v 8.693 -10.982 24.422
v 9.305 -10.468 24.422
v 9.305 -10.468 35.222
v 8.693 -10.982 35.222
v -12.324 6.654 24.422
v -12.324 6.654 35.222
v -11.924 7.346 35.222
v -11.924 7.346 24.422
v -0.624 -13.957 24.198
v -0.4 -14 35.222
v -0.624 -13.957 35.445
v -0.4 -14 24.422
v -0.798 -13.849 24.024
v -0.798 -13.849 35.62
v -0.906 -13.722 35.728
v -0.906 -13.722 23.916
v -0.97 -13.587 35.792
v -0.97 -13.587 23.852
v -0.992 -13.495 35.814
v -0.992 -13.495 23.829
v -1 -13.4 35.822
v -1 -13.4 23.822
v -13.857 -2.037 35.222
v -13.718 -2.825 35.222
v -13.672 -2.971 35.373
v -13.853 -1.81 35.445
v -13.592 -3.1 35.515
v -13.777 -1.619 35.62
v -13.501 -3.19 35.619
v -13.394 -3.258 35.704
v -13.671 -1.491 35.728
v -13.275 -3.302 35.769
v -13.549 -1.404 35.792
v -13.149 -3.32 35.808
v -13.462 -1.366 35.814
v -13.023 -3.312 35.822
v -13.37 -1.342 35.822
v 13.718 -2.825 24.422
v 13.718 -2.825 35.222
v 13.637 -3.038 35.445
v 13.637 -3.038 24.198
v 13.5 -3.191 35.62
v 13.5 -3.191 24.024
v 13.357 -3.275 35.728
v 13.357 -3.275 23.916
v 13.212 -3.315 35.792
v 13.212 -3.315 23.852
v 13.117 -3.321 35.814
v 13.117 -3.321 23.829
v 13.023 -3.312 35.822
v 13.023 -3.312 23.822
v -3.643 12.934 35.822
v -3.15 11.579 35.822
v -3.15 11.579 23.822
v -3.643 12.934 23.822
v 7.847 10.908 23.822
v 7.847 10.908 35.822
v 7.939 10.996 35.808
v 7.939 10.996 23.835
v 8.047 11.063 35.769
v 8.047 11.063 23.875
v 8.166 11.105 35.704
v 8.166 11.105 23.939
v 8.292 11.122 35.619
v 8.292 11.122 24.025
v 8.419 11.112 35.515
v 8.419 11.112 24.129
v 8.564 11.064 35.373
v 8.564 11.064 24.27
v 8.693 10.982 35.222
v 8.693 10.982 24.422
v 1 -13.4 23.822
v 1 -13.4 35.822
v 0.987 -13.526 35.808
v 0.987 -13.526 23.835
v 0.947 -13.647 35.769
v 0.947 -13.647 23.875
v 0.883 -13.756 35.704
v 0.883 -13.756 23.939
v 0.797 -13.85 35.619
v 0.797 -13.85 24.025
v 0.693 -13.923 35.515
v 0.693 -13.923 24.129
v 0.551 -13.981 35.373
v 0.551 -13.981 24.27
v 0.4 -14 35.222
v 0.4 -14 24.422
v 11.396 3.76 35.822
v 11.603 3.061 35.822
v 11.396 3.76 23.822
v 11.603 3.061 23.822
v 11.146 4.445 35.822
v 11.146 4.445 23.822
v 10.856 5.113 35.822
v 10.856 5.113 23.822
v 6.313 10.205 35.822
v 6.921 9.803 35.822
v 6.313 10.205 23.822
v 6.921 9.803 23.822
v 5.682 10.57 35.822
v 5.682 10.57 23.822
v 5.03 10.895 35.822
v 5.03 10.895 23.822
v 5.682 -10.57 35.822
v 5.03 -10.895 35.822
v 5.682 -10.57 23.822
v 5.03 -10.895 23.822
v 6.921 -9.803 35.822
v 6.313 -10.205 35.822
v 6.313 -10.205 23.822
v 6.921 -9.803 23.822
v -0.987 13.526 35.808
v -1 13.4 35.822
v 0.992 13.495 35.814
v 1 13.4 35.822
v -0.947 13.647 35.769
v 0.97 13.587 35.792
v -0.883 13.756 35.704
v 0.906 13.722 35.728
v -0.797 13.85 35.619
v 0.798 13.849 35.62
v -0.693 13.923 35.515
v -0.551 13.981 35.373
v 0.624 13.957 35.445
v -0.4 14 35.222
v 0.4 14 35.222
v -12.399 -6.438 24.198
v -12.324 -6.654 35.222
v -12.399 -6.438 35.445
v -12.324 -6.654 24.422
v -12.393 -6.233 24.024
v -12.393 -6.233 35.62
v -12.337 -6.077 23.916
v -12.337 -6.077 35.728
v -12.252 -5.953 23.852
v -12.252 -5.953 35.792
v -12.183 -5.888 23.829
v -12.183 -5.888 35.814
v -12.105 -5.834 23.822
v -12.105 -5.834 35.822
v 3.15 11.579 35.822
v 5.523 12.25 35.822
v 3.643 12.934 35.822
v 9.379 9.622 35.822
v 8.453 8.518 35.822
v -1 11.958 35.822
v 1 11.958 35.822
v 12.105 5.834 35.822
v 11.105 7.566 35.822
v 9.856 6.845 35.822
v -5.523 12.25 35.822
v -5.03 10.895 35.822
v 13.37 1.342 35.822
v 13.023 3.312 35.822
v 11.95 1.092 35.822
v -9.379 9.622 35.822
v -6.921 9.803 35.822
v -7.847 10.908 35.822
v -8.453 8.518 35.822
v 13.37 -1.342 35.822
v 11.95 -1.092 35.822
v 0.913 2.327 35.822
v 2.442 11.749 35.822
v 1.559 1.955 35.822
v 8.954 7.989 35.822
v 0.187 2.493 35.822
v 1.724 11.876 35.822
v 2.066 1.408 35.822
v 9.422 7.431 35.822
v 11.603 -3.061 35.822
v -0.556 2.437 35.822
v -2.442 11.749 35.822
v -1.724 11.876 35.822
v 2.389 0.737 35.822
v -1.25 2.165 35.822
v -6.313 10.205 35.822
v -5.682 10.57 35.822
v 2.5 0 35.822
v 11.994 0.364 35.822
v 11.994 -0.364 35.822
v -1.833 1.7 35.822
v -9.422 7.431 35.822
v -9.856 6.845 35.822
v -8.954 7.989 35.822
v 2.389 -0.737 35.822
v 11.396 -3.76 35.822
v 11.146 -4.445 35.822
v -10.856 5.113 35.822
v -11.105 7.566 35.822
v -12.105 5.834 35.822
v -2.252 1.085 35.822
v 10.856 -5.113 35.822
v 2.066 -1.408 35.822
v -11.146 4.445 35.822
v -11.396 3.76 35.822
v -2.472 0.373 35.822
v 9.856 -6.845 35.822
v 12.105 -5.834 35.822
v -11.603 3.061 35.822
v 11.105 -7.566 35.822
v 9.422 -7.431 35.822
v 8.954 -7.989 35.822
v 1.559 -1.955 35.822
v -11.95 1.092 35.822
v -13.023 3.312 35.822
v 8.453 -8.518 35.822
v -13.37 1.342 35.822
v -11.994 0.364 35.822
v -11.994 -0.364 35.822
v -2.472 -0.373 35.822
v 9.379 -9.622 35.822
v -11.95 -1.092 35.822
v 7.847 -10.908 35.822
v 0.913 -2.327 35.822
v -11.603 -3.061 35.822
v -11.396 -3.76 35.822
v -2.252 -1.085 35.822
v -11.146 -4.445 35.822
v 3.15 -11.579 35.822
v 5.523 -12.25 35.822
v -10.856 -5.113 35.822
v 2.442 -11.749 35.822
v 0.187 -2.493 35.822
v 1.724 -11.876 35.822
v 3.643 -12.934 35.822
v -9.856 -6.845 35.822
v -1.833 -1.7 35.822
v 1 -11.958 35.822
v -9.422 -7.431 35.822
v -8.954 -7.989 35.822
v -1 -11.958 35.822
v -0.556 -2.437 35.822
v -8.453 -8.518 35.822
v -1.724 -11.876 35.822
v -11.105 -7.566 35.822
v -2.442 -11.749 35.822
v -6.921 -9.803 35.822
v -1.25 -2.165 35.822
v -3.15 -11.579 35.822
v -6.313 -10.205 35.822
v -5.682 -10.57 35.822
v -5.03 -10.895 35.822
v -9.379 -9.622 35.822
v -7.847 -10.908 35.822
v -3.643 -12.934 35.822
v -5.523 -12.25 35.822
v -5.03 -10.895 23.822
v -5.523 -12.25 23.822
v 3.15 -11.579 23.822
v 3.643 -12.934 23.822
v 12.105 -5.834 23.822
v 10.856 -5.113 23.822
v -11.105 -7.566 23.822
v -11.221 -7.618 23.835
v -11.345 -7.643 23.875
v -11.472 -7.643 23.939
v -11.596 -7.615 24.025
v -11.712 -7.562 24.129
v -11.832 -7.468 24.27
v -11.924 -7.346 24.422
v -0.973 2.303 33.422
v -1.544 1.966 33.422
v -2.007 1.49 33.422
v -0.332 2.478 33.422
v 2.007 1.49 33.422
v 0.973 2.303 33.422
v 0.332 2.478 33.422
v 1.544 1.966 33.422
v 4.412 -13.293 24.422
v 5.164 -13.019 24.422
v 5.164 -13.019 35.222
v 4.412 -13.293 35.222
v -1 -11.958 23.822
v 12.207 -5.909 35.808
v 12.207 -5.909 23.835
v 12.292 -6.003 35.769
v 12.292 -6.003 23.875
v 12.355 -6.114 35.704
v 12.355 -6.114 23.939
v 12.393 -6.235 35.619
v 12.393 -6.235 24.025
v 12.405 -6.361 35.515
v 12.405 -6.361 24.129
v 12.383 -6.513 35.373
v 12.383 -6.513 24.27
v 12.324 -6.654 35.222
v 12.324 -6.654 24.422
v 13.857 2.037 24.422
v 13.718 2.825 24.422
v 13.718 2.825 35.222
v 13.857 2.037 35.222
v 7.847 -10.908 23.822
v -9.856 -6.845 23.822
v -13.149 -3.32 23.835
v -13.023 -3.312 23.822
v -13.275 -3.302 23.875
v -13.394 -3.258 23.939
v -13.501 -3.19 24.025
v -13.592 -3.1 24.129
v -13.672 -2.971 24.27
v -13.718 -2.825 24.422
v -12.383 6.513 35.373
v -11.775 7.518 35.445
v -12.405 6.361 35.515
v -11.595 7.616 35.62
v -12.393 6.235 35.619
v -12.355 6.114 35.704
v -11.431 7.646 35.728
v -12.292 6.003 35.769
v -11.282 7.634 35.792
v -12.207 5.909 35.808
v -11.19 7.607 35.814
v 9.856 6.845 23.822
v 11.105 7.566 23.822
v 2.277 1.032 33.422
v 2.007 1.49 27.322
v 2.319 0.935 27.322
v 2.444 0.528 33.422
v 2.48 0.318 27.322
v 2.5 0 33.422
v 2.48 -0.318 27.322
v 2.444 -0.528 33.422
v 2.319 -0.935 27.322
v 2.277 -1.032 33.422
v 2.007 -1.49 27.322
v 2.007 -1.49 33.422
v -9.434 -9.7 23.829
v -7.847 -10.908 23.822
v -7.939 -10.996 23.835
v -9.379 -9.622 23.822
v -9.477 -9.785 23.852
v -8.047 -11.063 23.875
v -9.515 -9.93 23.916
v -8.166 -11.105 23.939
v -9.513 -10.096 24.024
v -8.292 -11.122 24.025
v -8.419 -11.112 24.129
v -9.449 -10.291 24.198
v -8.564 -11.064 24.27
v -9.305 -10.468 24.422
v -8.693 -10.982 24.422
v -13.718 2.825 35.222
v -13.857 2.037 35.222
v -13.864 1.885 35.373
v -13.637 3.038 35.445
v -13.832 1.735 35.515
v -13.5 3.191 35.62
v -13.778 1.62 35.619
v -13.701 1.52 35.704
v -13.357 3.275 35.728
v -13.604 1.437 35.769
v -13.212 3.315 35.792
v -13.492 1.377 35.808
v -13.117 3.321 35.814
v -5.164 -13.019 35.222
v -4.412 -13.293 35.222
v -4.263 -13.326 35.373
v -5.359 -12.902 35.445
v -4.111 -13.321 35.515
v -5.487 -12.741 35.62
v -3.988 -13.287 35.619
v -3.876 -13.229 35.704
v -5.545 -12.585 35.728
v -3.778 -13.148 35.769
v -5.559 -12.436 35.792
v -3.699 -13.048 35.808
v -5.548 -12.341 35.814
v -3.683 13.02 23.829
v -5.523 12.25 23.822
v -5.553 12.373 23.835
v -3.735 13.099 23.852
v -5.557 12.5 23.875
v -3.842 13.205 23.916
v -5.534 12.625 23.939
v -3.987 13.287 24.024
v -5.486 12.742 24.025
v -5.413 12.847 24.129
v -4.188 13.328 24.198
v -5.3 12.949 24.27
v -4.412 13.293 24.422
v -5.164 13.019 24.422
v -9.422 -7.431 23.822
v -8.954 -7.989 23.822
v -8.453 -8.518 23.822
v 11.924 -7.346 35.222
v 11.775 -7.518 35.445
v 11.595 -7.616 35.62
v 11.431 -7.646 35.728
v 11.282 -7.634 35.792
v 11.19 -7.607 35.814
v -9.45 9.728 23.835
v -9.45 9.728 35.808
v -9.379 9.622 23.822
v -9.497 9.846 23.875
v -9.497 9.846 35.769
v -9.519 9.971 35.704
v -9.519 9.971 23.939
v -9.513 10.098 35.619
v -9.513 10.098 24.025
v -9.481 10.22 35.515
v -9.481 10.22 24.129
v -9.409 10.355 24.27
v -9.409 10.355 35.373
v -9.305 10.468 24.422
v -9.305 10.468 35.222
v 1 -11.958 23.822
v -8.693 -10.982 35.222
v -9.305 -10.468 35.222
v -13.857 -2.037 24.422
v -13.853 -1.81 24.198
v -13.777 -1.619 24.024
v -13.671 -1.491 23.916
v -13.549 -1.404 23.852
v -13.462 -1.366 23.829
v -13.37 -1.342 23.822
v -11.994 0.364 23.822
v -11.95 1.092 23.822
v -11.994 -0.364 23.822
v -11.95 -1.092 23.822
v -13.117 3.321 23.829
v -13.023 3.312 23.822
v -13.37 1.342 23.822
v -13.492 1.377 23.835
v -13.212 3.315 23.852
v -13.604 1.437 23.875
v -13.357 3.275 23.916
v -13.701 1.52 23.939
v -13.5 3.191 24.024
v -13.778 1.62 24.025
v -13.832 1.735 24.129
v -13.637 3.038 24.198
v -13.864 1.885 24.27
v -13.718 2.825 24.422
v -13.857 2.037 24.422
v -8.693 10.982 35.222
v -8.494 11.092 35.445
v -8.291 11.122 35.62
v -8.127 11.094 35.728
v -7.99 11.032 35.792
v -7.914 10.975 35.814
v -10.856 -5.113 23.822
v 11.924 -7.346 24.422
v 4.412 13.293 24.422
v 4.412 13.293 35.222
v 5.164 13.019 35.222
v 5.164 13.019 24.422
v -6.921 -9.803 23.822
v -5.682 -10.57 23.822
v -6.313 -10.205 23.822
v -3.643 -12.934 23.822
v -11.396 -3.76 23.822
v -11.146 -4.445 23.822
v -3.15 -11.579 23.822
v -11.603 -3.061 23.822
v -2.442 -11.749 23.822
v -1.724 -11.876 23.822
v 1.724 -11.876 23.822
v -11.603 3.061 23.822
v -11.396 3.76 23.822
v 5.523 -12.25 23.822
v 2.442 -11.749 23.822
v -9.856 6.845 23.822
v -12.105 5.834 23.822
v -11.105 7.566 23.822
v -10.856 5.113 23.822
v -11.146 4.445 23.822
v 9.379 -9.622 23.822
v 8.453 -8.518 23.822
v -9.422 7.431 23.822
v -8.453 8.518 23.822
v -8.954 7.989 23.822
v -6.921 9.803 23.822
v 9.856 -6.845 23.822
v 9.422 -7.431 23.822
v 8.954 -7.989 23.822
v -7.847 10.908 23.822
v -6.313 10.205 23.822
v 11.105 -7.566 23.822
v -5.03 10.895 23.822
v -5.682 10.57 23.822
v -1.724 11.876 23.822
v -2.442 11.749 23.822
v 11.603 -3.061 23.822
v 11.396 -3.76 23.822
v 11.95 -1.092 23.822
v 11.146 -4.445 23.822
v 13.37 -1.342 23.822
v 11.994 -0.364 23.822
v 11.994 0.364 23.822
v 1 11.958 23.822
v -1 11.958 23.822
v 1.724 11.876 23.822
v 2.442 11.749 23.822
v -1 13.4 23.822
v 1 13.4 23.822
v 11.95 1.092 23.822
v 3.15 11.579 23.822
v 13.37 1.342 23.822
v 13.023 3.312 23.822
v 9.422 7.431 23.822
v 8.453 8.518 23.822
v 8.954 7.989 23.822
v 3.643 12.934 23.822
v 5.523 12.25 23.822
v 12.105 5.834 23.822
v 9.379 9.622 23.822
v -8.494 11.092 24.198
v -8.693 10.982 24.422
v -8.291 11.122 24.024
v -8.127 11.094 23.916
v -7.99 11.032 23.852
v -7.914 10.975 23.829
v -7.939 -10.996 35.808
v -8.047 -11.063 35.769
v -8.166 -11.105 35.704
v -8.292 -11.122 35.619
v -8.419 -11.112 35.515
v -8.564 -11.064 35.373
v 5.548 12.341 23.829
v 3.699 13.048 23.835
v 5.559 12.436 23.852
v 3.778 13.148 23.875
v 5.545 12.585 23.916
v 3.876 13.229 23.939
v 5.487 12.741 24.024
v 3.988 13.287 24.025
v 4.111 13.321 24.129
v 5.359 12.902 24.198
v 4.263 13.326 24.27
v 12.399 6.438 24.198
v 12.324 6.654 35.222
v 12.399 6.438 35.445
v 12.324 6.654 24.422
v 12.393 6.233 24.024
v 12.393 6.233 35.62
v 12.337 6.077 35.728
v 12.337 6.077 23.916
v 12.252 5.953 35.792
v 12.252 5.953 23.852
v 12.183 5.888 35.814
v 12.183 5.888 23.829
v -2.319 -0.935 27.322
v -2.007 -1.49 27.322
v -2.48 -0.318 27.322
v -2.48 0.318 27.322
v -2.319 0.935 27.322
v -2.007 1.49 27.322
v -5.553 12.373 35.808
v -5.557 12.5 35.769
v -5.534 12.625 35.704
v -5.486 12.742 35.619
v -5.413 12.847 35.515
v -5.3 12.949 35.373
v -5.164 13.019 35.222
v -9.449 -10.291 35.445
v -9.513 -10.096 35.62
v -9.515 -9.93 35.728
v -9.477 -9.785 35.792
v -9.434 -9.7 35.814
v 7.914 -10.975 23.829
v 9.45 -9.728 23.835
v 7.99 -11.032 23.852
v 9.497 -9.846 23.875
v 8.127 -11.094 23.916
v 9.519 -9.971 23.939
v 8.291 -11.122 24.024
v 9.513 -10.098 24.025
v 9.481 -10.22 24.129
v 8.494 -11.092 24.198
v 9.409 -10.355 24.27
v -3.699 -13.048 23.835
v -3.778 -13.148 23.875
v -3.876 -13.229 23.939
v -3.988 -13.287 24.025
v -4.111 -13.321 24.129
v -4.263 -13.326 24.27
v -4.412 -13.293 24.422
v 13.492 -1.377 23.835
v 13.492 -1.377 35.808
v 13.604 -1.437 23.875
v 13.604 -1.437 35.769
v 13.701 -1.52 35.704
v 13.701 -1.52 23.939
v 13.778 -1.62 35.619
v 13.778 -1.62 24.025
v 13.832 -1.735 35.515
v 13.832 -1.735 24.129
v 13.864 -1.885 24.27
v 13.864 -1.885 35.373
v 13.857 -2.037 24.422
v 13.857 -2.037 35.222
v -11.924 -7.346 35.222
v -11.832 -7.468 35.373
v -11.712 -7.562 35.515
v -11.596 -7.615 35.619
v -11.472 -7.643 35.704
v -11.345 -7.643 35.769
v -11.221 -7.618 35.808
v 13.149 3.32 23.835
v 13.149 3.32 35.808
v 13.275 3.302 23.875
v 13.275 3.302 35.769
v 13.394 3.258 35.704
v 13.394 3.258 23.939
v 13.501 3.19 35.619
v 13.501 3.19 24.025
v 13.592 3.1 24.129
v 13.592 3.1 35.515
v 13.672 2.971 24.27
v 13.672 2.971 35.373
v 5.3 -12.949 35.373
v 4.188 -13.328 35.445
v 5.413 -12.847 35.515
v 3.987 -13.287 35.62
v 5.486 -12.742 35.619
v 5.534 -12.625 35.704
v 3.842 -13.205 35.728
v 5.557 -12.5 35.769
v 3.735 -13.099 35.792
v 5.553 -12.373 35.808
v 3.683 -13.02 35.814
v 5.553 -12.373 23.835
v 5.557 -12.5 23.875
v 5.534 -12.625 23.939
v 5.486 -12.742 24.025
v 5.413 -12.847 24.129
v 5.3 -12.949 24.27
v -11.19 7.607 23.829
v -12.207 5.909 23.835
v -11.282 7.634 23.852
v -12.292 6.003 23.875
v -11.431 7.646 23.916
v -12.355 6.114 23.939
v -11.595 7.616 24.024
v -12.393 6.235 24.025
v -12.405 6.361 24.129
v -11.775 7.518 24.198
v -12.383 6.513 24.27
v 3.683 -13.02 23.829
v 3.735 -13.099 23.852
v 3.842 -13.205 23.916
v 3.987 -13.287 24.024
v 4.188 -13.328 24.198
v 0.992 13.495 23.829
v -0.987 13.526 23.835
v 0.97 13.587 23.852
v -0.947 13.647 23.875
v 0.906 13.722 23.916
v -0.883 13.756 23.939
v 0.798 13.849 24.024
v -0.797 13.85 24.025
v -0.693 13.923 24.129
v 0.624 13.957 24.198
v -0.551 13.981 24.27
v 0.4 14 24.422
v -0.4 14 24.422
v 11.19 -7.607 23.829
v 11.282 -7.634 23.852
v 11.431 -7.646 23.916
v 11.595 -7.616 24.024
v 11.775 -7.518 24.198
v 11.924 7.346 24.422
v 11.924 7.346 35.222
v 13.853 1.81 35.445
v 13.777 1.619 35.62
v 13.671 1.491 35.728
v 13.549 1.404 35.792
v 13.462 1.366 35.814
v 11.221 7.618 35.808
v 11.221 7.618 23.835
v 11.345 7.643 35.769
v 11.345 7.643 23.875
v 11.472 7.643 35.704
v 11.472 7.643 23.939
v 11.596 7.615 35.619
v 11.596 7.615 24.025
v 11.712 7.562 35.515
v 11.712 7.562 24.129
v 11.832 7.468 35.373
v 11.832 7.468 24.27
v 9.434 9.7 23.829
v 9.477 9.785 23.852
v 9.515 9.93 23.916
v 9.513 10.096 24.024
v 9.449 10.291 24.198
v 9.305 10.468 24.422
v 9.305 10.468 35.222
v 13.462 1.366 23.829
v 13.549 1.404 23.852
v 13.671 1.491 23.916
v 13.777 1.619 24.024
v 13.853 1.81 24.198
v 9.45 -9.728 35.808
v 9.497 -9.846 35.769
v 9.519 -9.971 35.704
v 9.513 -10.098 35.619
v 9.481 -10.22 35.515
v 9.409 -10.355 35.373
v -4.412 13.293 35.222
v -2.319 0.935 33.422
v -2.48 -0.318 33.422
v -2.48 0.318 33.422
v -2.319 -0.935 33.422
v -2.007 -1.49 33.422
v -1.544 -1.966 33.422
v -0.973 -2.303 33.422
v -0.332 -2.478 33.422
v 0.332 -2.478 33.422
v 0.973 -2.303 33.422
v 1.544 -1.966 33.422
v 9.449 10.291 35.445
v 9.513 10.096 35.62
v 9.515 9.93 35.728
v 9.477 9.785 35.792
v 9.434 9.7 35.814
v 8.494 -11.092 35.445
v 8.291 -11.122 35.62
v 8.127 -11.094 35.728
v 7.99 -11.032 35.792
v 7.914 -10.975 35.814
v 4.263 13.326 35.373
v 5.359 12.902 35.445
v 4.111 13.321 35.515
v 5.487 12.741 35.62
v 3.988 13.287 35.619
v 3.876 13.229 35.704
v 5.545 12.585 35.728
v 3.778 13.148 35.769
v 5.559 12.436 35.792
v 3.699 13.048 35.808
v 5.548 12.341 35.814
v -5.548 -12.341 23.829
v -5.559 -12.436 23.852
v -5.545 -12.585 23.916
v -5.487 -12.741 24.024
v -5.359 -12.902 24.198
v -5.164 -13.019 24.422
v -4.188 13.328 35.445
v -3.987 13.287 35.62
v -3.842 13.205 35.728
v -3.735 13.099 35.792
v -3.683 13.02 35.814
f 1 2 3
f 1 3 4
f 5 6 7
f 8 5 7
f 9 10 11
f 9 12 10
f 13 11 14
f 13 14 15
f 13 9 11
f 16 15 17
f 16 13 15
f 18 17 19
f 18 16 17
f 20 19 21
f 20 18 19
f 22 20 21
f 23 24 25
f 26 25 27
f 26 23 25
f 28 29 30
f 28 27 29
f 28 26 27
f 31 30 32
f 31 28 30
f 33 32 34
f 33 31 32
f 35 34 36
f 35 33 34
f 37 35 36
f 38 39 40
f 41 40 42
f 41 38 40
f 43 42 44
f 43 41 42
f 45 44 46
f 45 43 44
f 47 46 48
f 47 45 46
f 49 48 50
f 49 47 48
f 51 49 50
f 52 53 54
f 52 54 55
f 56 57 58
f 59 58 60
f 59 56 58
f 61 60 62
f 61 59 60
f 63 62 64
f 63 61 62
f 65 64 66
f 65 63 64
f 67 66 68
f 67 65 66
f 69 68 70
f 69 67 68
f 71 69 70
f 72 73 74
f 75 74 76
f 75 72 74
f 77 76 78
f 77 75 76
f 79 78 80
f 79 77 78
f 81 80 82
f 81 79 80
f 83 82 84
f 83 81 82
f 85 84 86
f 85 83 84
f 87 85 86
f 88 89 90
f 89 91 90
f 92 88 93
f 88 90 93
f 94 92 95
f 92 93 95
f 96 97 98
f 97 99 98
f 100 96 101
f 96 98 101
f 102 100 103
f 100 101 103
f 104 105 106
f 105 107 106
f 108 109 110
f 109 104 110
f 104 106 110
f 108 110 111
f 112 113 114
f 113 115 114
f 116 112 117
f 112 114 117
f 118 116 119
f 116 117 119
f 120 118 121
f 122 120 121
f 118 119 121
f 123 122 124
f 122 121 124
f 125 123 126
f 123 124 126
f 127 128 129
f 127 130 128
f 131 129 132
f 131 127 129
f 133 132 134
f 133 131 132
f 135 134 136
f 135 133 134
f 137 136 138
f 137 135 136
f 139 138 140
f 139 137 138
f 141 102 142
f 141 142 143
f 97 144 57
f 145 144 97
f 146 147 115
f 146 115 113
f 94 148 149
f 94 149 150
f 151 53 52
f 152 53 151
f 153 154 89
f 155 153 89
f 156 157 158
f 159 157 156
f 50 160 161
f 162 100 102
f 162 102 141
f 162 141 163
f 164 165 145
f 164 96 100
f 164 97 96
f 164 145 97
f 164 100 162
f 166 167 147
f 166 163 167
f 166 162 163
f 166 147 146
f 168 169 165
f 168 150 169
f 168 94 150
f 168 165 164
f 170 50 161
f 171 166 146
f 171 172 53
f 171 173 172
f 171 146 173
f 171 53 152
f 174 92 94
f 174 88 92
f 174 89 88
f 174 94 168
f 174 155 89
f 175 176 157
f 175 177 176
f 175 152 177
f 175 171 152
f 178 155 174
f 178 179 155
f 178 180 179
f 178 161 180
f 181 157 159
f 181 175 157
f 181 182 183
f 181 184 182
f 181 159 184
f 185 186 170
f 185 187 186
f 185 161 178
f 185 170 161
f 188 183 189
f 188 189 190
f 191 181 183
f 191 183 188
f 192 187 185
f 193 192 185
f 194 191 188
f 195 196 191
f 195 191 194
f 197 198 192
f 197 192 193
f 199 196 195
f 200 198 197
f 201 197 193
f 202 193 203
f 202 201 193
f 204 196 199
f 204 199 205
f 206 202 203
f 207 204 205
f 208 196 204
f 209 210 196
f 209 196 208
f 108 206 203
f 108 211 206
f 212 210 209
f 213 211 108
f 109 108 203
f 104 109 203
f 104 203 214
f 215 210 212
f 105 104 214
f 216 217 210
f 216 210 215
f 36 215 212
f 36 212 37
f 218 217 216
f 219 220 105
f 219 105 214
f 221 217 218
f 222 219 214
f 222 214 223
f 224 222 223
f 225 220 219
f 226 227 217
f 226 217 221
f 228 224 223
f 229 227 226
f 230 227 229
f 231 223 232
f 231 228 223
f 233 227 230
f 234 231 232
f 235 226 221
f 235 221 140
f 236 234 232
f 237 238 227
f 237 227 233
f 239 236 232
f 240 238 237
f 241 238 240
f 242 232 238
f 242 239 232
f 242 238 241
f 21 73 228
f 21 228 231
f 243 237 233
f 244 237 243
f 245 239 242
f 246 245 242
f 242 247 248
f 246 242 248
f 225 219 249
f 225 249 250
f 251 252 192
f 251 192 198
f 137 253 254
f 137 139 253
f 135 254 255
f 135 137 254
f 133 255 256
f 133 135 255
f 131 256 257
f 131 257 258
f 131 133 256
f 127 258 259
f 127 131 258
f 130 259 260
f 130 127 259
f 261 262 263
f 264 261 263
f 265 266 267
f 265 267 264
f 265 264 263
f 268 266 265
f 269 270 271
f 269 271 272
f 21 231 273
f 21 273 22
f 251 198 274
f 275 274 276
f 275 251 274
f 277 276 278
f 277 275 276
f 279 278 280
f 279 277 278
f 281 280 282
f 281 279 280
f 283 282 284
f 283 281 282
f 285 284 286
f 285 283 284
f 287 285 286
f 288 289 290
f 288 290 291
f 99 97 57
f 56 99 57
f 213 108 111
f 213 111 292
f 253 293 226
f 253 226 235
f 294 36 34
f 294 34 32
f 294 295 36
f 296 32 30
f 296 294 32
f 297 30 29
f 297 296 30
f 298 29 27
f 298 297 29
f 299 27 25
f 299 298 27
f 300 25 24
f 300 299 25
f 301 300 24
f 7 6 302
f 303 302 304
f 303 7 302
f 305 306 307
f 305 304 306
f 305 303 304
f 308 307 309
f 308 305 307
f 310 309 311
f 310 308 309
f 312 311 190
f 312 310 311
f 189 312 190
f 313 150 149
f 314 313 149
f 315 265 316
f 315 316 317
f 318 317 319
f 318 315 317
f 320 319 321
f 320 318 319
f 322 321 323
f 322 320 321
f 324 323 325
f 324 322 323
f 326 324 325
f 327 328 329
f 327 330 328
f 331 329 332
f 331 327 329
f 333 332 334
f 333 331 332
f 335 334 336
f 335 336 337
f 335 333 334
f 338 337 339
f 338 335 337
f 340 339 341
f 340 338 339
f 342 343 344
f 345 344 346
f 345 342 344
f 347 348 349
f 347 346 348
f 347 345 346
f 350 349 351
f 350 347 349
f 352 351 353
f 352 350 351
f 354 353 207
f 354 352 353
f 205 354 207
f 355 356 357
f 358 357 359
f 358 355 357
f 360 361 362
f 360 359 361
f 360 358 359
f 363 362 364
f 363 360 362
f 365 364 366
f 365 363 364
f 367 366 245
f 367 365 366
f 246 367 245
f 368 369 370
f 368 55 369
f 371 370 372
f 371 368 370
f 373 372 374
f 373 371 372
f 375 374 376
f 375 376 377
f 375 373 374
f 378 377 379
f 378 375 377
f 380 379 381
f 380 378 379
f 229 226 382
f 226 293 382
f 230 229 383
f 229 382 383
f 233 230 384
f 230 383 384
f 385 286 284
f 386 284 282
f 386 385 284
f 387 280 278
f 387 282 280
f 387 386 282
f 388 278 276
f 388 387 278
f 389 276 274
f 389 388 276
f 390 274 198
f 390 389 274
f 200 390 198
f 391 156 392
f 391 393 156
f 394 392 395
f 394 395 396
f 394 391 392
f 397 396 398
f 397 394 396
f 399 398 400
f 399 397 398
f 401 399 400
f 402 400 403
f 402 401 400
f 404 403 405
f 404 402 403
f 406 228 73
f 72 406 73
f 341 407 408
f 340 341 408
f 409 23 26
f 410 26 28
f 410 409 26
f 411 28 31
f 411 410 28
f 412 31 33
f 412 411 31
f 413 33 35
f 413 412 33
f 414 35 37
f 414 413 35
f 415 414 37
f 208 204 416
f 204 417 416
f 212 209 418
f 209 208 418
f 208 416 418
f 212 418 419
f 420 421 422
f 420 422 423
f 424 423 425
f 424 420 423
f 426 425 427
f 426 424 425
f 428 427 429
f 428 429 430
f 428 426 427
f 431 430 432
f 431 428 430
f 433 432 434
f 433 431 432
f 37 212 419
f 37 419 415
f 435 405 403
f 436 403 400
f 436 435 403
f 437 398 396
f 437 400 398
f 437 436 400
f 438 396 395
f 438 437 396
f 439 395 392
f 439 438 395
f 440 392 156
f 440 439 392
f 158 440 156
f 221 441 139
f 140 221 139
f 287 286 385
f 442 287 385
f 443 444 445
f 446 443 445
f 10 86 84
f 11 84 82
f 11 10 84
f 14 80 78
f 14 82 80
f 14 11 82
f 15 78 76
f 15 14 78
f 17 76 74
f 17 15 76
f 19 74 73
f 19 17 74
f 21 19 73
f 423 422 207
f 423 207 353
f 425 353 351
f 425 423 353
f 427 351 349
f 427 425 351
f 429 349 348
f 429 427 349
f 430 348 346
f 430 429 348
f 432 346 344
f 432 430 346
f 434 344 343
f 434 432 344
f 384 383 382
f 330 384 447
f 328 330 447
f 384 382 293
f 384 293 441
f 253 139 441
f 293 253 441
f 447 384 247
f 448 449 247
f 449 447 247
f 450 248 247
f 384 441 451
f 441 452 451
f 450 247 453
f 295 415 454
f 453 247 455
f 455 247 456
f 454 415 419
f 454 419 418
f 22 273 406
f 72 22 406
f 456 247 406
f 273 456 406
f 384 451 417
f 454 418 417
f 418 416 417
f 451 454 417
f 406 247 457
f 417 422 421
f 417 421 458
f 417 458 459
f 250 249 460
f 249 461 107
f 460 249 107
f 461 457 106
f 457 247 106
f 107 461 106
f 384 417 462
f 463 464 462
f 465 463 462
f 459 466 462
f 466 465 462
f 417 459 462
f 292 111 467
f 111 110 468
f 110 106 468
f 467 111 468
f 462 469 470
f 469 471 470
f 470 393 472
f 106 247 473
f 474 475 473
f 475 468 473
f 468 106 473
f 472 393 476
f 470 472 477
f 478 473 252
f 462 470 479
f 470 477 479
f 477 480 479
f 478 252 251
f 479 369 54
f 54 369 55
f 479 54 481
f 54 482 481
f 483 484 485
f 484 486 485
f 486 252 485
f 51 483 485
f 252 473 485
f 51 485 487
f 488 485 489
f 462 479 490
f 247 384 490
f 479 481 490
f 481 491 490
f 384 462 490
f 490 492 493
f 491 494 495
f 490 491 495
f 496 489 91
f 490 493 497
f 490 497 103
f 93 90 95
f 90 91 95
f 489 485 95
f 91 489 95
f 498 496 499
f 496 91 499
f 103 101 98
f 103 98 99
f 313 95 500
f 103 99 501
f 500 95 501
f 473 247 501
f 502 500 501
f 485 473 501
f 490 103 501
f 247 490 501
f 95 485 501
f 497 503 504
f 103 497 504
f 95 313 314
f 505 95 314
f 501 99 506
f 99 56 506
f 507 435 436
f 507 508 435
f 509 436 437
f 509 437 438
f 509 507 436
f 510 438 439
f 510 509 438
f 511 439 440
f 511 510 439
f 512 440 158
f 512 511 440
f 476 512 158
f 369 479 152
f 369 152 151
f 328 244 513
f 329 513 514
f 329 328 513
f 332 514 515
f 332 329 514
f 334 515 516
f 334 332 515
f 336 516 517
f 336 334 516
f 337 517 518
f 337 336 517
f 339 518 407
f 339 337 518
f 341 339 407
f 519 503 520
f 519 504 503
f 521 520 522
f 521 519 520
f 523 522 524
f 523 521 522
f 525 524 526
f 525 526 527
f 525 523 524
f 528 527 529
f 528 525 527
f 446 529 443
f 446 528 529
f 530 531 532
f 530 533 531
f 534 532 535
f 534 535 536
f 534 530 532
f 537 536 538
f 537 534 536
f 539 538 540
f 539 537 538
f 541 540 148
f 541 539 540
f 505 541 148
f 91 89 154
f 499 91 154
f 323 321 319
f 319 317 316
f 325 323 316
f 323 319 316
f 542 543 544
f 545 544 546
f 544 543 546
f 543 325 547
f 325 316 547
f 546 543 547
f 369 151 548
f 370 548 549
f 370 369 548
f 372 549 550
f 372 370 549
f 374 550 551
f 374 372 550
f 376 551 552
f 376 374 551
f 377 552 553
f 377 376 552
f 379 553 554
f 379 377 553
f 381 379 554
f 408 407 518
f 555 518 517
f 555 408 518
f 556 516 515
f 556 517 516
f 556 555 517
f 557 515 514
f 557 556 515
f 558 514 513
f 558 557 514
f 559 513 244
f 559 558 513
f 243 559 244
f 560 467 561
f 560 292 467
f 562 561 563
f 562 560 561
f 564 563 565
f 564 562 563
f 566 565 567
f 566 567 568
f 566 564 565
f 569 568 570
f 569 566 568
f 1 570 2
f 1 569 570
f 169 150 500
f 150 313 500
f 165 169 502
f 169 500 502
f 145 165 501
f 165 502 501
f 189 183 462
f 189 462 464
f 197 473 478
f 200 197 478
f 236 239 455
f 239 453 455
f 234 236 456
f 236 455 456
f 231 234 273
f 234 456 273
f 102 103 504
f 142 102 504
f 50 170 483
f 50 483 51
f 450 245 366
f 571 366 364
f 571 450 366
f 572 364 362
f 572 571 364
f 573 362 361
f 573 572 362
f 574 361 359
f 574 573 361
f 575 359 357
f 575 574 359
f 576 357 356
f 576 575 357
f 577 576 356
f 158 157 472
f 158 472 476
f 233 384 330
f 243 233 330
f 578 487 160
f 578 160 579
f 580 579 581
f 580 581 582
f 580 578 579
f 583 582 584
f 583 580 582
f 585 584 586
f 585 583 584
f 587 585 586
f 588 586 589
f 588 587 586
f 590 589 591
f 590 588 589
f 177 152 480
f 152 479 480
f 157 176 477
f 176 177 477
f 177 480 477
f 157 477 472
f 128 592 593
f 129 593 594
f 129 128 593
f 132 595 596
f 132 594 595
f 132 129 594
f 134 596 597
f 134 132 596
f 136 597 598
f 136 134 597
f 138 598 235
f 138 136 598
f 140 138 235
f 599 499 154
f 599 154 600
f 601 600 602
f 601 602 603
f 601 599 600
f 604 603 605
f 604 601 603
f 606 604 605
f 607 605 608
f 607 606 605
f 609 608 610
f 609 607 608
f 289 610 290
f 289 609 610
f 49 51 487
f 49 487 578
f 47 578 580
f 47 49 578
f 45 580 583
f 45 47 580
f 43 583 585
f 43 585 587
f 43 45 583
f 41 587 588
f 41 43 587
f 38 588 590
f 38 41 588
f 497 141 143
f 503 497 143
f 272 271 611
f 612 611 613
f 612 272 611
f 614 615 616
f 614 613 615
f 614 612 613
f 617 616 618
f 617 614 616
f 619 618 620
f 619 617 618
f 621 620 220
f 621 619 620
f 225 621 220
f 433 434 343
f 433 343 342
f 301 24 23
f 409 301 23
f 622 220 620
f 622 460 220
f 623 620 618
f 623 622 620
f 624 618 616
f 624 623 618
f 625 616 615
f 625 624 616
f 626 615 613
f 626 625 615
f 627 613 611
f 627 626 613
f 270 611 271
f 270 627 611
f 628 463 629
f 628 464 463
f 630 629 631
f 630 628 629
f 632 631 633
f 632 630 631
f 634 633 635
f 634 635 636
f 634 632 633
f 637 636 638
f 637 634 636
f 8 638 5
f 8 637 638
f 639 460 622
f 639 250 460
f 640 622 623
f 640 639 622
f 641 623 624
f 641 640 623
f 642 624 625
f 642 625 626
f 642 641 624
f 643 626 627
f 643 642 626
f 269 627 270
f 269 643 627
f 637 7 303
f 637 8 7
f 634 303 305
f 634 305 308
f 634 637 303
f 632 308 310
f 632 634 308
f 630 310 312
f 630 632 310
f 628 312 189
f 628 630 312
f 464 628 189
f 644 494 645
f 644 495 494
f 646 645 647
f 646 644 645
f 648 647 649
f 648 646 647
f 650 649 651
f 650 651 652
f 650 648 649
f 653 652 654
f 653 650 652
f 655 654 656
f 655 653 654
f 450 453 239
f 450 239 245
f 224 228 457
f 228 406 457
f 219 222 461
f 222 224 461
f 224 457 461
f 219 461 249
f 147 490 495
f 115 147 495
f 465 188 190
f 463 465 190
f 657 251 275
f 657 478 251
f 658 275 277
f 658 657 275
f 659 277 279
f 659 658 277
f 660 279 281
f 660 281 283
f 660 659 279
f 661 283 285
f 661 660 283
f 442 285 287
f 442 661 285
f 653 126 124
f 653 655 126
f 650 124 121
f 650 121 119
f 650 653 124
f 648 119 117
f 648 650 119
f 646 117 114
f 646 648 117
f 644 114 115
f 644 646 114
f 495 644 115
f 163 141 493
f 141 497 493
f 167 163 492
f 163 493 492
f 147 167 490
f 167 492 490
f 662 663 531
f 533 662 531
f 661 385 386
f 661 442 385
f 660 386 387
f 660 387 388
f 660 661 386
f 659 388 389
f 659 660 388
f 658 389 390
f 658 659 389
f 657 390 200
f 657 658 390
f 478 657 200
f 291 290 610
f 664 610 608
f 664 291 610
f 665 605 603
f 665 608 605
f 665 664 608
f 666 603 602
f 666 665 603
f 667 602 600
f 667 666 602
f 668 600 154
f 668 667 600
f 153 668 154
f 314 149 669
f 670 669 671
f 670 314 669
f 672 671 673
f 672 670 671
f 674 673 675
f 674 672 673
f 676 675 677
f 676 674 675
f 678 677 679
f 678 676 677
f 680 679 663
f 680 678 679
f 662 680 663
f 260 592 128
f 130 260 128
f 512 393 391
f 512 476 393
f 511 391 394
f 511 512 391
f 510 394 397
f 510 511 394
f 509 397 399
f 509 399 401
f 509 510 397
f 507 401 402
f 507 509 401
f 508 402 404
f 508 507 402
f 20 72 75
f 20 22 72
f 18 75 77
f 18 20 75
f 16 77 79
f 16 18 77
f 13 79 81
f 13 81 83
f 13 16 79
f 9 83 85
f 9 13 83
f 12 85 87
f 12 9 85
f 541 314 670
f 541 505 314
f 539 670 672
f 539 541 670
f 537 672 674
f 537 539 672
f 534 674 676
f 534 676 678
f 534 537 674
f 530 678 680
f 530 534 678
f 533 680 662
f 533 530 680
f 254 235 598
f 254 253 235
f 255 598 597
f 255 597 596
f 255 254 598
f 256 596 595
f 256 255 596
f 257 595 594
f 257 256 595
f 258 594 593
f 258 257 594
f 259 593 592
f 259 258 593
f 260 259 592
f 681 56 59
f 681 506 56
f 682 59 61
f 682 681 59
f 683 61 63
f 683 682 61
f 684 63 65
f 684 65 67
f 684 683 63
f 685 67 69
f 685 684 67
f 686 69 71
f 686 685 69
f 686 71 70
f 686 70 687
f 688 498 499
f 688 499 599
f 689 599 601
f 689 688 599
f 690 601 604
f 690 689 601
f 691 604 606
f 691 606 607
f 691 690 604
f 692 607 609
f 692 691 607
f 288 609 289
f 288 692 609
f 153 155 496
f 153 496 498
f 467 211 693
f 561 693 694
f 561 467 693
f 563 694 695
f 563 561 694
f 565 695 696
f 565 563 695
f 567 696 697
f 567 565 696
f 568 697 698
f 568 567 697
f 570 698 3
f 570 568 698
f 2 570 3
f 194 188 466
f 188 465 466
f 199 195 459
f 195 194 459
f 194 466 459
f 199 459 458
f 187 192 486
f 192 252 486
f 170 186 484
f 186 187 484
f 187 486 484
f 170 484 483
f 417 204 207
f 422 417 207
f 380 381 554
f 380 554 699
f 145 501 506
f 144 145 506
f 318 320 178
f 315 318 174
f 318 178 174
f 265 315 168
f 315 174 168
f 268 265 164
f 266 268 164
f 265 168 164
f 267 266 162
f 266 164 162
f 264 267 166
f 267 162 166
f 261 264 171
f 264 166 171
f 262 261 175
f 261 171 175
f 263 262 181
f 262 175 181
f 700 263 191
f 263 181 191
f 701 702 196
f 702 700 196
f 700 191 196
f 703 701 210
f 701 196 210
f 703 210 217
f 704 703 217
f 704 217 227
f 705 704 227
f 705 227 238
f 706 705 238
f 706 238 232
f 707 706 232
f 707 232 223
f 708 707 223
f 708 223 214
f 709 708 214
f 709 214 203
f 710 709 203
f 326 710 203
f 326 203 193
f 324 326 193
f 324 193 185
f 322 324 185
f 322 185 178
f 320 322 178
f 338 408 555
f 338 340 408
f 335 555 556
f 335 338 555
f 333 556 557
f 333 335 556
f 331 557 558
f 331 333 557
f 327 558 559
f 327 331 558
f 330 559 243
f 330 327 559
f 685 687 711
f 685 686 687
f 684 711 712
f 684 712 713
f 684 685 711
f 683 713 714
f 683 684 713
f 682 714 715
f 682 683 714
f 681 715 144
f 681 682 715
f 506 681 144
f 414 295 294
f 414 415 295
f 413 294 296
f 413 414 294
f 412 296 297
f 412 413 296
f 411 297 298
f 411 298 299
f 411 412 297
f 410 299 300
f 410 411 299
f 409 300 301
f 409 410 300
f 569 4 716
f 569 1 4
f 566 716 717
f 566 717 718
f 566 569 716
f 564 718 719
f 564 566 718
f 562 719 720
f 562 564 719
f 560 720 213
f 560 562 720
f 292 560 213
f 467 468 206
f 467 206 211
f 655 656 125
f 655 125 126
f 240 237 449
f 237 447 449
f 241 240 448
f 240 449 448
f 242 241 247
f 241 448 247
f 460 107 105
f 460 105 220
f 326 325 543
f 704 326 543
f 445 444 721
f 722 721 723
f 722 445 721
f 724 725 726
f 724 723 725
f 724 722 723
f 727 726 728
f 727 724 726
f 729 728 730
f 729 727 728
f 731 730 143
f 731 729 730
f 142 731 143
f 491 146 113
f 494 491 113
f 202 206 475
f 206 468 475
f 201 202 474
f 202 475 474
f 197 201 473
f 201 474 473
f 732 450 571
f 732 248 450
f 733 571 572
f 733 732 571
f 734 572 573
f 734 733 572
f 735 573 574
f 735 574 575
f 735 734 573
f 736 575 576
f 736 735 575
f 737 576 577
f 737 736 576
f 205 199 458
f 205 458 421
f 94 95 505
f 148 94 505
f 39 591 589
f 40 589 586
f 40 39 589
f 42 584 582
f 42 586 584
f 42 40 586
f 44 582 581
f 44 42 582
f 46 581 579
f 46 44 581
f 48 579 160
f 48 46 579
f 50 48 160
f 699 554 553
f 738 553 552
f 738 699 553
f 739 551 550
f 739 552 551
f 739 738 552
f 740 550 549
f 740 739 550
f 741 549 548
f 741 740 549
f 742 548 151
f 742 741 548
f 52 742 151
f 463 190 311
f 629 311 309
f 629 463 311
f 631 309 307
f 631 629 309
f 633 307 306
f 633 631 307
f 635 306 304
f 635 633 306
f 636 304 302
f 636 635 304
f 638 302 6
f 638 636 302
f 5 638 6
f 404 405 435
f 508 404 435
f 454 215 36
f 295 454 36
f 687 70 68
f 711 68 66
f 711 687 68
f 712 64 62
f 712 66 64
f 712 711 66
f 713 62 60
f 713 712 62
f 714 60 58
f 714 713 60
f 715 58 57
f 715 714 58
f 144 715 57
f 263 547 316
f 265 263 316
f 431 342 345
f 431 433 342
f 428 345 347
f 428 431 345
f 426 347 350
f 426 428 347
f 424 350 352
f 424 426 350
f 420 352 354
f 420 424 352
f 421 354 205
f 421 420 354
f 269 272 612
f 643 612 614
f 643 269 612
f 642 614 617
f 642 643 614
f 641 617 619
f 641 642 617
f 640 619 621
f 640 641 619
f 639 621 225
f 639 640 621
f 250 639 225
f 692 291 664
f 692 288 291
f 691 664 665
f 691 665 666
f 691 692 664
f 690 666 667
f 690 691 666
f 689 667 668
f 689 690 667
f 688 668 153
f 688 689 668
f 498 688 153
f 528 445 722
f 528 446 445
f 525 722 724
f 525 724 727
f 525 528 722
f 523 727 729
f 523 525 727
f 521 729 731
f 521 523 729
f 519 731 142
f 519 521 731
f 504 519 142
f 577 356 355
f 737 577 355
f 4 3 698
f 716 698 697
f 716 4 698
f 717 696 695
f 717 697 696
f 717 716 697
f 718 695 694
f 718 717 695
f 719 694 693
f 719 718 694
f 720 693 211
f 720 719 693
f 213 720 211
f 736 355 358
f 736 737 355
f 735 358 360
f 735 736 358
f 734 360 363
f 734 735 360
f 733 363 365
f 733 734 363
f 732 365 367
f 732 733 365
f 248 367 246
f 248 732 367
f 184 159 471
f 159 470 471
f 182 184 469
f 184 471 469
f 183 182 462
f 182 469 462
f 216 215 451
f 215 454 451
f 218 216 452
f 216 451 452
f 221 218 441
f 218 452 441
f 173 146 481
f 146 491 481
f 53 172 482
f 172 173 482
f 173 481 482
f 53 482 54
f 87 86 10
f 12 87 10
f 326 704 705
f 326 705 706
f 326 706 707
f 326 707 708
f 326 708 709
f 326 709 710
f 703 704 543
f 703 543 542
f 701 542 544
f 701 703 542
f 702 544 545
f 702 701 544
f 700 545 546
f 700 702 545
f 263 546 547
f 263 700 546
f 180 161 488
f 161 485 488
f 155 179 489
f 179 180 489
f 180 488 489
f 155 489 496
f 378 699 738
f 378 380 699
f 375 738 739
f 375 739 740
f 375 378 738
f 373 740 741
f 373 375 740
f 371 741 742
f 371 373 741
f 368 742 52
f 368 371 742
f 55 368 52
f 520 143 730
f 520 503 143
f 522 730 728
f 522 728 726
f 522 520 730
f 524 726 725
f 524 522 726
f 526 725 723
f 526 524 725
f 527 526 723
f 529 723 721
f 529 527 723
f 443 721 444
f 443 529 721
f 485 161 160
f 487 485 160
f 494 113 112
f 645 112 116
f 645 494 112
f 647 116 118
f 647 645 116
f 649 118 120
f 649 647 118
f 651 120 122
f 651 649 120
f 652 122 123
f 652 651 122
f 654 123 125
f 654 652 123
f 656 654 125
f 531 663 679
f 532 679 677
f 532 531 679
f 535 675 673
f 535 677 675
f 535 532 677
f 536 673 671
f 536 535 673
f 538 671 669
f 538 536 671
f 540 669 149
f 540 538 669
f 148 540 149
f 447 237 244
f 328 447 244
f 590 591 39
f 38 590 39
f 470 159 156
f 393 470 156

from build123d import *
from build123d.topology import SkipClean

# Parameters (mm, degrees)
SKETCH2_R                = 60
BOSS_EXTRUDE1_DEPTH      = 60
SKETCH3_W                = 10
SKETCH3_H                = 10.47851478
BOSS_EXTRUDE2_DEPTH      = 60
FILLET2_R                = 3
CIRPATTERN1_COUNT        = 18
FILLET2_OF_CIRPATTERN1_R = 3
SKETCH4_R                = 10
CUT_EXTRUDE1_DEPTH       = 60
SKETCH5_R                = 22.481820488
BOSS_EXTRUDE3_DEPTH      = 60
SKETCH6_R                = 12.5
CUT_EXTRUDE2_DEPTH       = 12
CUT_EXTRUDE3_DEPTH       = 30.5
SCALE1_SCALE             = 0.2


with BuildPart() as part:
    # Sketch2 → Boss-Extrude1 (new body)
    with BuildSketch(Plane.XY):
        Circle(SKETCH2_R)
    extrude(amount=BOSS_EXTRUDE1_DEPTH)

    # Sketch3 → Boss-Extrude2 (add)
    with BuildSketch(Plane.XY.offset(60)):
        with Locations((0, 64.76074261)):
            Rectangle(SKETCH3_W, SKETCH3_H)
    boss_extrude2 = extrude(amount=-BOSS_EXTRUDE2_DEPTH)

    # Fillet2
    fillet2_edges = [part.edges().sort_by_distance(p)[0] for p in [
        (5, 70, 30),
        (0, 70, 0),
        (-5, 70, 30),
        (0, 70, 60),
    ]]
    fillet(fillet2_edges, radius=FILLET2_R)

    # CirPattern1: Boss-Extrude2 ×18 about axis
    cirpattern1_axis = Axis((0, 0, 0), (0, 0, 1))
    for i in range(1, CIRPATTERN1_COUNT):
        add(boss_extrude2.rotate(cirpattern1_axis, i * 360 / CIRPATTERN1_COUNT))

    # Fillet2 of CirPattern1
    fillet2_of_cirpattern1_edges = [part.edges().sort_by_distance(p)[0] for p in [
        (-19.242946929, 67.488584172, 30),
        (-23.941410033, 65.778483455, 0),
        (-28.639873137, 64.068382738, 30),
        (-23.941410033, 65.778483455, 60),
        (-41.164910462, 56.837049067, 30),
        (-44.995132678, 53.623111018, 0),
        (-48.825354894, 50.40917297, 30),
        (-44.995132678, 53.623111018, 60),
        (-58.121778265, 39.330127019, 30),
        (-60.621778265, 35, 0),
        (-63.121778265, 30.669872981, 30),
        (-60.621778265, 35, 60),
        (-68.068301823, 17.079411202, 30),
        (-68.936542711, 12.155372437, 0),
        (-69.804783599, 7.231333672, 30),
        (-68.936542711, 12.155372437, 60),
        (-69.804783599, -7.231333672, 30),
        (-68.936542711, -12.155372437, 0),
        (-68.068301823, -17.079411202, 30),
        (-68.936542711, -12.155372437, 60),
        (-63.121778265, -30.669872981, 30),
        (-60.621778265, -35, 0),
        (-58.121778265, -39.330127019, 30),
        (-60.621778265, -35, 60),
        (-48.825354894, -50.40917297, 30),
        (-44.995132678, -53.623111018, 0),
        (-41.164910462, -56.837049067, 30),
        (-44.995132678, -53.623111018, 60),
        (-28.639873137, -64.068382738, 30),
        (-23.941410033, -65.778483455, 0),
        (-19.242946929, -67.488584172, 30),
        (-23.941410033, -65.778483455, 60),
        (-5, -70, 30),
        (0, -70, 0),
        (5, -70, 30),
        (0, -70, 60),
        (19.242946929, -67.488584172, 30),
        (23.941410033, -65.778483455, 0),
        (28.639873137, -64.068382738, 30),
        (23.941410033, -65.778483455, 60),
        (41.164910462, -56.837049067, 30),
        (44.995132678, -53.623111018, 0),
        (48.825354894, -50.40917297, 30),
        (44.995132678, -53.623111018, 60),
        (58.121778265, -39.330127019, 30),
        (60.621778265, -35, 0),
        (63.121778265, -30.669872981, 30),
        (60.621778265, -35, 60),
        (68.068301823, -17.079411202, 30),
        (68.936542711, -12.155372437, 0),
        (69.804783599, -7.231333672, 30),
        (68.936542711, -12.155372437, 60),
        (69.804783599, 7.231333672, 30),
        (68.936542711, 12.155372437, 0),
        (68.068301823, 17.079411202, 30),
        (68.936542711, 12.155372437, 60),
        (63.121778265, 30.669872981, 30),
        (60.621778265, 35, 0),
        (58.121778265, 39.330127019, 30),
        (60.621778265, 35, 60),
        (48.825354894, 50.40917297, 30),
        (44.995132678, 53.623111018, 0),
        (41.164910462, 56.837049067, 30),
        (44.995132678, 53.623111018, 60),
        (28.639873137, 64.068382738, 30),
        (23.941410033, 65.778483455, 0),
        (19.242946929, 67.488584172, 30),
        (23.941410033, 65.778483455, 60),
    ]]
    fillet(fillet2_of_cirpattern1_edges, radius=FILLET2_OF_CIRPATTERN1_R)

    # Sketch4 → Cut-Extrude1 (cut)
    with BuildSketch(Plane.XY.offset(60)):
        Circle(SKETCH4_R)
    extrude(amount=-CUT_EXTRUDE1_DEPTH, mode=Mode.SUBTRACT)

    # Sketch5 → Boss-Extrude3 (add)
    with BuildSketch(Plane.XY.offset(60)):
        Circle(SKETCH5_R)
    extrude(amount=-BOSS_EXTRUDE3_DEPTH)

    # Sketch6 → Cut-Extrude2 (cut)
    with BuildSketch(Plane.XY.offset(60)):
        Circle(SKETCH6_R)
    extrude(amount=-CUT_EXTRUDE2_DEPTH, mode=Mode.SUBTRACT)

    # Sketch7 → Cut-Extrude3 (cut)
    with SkipClean():  # the faces are left unmerged after this step: merging them gives an invalid solid
        with BuildSketch(Plane.XY.offset(48)):
            with BuildLine():
                Line((10.037305415, -7.45), (-10.037305415, -7.45))
                ThreePointArc((-10.037305415, -7.45), (-12.5, 0), (-10.037305415, 7.45))
                Line((-10.037305415, 7.45), (10.037305415, 7.45))
                ThreePointArc((10.037305415, 7.45), (12.5, 0), (10.037305415, -7.45))
            make_face()
        extrude(amount=-CUT_EXTRUDE3_DEPTH, mode=Mode.SUBTRACT)


with BuildPart() as part_1:
    # Scale1: scaled about (3e-09, 1e-09, 29.777250978)
    add(part.part.scale(SCALE1_SCALE).moved(Location((2e-09, 1e-09, 23.821800782))))


solid = part_1.part
